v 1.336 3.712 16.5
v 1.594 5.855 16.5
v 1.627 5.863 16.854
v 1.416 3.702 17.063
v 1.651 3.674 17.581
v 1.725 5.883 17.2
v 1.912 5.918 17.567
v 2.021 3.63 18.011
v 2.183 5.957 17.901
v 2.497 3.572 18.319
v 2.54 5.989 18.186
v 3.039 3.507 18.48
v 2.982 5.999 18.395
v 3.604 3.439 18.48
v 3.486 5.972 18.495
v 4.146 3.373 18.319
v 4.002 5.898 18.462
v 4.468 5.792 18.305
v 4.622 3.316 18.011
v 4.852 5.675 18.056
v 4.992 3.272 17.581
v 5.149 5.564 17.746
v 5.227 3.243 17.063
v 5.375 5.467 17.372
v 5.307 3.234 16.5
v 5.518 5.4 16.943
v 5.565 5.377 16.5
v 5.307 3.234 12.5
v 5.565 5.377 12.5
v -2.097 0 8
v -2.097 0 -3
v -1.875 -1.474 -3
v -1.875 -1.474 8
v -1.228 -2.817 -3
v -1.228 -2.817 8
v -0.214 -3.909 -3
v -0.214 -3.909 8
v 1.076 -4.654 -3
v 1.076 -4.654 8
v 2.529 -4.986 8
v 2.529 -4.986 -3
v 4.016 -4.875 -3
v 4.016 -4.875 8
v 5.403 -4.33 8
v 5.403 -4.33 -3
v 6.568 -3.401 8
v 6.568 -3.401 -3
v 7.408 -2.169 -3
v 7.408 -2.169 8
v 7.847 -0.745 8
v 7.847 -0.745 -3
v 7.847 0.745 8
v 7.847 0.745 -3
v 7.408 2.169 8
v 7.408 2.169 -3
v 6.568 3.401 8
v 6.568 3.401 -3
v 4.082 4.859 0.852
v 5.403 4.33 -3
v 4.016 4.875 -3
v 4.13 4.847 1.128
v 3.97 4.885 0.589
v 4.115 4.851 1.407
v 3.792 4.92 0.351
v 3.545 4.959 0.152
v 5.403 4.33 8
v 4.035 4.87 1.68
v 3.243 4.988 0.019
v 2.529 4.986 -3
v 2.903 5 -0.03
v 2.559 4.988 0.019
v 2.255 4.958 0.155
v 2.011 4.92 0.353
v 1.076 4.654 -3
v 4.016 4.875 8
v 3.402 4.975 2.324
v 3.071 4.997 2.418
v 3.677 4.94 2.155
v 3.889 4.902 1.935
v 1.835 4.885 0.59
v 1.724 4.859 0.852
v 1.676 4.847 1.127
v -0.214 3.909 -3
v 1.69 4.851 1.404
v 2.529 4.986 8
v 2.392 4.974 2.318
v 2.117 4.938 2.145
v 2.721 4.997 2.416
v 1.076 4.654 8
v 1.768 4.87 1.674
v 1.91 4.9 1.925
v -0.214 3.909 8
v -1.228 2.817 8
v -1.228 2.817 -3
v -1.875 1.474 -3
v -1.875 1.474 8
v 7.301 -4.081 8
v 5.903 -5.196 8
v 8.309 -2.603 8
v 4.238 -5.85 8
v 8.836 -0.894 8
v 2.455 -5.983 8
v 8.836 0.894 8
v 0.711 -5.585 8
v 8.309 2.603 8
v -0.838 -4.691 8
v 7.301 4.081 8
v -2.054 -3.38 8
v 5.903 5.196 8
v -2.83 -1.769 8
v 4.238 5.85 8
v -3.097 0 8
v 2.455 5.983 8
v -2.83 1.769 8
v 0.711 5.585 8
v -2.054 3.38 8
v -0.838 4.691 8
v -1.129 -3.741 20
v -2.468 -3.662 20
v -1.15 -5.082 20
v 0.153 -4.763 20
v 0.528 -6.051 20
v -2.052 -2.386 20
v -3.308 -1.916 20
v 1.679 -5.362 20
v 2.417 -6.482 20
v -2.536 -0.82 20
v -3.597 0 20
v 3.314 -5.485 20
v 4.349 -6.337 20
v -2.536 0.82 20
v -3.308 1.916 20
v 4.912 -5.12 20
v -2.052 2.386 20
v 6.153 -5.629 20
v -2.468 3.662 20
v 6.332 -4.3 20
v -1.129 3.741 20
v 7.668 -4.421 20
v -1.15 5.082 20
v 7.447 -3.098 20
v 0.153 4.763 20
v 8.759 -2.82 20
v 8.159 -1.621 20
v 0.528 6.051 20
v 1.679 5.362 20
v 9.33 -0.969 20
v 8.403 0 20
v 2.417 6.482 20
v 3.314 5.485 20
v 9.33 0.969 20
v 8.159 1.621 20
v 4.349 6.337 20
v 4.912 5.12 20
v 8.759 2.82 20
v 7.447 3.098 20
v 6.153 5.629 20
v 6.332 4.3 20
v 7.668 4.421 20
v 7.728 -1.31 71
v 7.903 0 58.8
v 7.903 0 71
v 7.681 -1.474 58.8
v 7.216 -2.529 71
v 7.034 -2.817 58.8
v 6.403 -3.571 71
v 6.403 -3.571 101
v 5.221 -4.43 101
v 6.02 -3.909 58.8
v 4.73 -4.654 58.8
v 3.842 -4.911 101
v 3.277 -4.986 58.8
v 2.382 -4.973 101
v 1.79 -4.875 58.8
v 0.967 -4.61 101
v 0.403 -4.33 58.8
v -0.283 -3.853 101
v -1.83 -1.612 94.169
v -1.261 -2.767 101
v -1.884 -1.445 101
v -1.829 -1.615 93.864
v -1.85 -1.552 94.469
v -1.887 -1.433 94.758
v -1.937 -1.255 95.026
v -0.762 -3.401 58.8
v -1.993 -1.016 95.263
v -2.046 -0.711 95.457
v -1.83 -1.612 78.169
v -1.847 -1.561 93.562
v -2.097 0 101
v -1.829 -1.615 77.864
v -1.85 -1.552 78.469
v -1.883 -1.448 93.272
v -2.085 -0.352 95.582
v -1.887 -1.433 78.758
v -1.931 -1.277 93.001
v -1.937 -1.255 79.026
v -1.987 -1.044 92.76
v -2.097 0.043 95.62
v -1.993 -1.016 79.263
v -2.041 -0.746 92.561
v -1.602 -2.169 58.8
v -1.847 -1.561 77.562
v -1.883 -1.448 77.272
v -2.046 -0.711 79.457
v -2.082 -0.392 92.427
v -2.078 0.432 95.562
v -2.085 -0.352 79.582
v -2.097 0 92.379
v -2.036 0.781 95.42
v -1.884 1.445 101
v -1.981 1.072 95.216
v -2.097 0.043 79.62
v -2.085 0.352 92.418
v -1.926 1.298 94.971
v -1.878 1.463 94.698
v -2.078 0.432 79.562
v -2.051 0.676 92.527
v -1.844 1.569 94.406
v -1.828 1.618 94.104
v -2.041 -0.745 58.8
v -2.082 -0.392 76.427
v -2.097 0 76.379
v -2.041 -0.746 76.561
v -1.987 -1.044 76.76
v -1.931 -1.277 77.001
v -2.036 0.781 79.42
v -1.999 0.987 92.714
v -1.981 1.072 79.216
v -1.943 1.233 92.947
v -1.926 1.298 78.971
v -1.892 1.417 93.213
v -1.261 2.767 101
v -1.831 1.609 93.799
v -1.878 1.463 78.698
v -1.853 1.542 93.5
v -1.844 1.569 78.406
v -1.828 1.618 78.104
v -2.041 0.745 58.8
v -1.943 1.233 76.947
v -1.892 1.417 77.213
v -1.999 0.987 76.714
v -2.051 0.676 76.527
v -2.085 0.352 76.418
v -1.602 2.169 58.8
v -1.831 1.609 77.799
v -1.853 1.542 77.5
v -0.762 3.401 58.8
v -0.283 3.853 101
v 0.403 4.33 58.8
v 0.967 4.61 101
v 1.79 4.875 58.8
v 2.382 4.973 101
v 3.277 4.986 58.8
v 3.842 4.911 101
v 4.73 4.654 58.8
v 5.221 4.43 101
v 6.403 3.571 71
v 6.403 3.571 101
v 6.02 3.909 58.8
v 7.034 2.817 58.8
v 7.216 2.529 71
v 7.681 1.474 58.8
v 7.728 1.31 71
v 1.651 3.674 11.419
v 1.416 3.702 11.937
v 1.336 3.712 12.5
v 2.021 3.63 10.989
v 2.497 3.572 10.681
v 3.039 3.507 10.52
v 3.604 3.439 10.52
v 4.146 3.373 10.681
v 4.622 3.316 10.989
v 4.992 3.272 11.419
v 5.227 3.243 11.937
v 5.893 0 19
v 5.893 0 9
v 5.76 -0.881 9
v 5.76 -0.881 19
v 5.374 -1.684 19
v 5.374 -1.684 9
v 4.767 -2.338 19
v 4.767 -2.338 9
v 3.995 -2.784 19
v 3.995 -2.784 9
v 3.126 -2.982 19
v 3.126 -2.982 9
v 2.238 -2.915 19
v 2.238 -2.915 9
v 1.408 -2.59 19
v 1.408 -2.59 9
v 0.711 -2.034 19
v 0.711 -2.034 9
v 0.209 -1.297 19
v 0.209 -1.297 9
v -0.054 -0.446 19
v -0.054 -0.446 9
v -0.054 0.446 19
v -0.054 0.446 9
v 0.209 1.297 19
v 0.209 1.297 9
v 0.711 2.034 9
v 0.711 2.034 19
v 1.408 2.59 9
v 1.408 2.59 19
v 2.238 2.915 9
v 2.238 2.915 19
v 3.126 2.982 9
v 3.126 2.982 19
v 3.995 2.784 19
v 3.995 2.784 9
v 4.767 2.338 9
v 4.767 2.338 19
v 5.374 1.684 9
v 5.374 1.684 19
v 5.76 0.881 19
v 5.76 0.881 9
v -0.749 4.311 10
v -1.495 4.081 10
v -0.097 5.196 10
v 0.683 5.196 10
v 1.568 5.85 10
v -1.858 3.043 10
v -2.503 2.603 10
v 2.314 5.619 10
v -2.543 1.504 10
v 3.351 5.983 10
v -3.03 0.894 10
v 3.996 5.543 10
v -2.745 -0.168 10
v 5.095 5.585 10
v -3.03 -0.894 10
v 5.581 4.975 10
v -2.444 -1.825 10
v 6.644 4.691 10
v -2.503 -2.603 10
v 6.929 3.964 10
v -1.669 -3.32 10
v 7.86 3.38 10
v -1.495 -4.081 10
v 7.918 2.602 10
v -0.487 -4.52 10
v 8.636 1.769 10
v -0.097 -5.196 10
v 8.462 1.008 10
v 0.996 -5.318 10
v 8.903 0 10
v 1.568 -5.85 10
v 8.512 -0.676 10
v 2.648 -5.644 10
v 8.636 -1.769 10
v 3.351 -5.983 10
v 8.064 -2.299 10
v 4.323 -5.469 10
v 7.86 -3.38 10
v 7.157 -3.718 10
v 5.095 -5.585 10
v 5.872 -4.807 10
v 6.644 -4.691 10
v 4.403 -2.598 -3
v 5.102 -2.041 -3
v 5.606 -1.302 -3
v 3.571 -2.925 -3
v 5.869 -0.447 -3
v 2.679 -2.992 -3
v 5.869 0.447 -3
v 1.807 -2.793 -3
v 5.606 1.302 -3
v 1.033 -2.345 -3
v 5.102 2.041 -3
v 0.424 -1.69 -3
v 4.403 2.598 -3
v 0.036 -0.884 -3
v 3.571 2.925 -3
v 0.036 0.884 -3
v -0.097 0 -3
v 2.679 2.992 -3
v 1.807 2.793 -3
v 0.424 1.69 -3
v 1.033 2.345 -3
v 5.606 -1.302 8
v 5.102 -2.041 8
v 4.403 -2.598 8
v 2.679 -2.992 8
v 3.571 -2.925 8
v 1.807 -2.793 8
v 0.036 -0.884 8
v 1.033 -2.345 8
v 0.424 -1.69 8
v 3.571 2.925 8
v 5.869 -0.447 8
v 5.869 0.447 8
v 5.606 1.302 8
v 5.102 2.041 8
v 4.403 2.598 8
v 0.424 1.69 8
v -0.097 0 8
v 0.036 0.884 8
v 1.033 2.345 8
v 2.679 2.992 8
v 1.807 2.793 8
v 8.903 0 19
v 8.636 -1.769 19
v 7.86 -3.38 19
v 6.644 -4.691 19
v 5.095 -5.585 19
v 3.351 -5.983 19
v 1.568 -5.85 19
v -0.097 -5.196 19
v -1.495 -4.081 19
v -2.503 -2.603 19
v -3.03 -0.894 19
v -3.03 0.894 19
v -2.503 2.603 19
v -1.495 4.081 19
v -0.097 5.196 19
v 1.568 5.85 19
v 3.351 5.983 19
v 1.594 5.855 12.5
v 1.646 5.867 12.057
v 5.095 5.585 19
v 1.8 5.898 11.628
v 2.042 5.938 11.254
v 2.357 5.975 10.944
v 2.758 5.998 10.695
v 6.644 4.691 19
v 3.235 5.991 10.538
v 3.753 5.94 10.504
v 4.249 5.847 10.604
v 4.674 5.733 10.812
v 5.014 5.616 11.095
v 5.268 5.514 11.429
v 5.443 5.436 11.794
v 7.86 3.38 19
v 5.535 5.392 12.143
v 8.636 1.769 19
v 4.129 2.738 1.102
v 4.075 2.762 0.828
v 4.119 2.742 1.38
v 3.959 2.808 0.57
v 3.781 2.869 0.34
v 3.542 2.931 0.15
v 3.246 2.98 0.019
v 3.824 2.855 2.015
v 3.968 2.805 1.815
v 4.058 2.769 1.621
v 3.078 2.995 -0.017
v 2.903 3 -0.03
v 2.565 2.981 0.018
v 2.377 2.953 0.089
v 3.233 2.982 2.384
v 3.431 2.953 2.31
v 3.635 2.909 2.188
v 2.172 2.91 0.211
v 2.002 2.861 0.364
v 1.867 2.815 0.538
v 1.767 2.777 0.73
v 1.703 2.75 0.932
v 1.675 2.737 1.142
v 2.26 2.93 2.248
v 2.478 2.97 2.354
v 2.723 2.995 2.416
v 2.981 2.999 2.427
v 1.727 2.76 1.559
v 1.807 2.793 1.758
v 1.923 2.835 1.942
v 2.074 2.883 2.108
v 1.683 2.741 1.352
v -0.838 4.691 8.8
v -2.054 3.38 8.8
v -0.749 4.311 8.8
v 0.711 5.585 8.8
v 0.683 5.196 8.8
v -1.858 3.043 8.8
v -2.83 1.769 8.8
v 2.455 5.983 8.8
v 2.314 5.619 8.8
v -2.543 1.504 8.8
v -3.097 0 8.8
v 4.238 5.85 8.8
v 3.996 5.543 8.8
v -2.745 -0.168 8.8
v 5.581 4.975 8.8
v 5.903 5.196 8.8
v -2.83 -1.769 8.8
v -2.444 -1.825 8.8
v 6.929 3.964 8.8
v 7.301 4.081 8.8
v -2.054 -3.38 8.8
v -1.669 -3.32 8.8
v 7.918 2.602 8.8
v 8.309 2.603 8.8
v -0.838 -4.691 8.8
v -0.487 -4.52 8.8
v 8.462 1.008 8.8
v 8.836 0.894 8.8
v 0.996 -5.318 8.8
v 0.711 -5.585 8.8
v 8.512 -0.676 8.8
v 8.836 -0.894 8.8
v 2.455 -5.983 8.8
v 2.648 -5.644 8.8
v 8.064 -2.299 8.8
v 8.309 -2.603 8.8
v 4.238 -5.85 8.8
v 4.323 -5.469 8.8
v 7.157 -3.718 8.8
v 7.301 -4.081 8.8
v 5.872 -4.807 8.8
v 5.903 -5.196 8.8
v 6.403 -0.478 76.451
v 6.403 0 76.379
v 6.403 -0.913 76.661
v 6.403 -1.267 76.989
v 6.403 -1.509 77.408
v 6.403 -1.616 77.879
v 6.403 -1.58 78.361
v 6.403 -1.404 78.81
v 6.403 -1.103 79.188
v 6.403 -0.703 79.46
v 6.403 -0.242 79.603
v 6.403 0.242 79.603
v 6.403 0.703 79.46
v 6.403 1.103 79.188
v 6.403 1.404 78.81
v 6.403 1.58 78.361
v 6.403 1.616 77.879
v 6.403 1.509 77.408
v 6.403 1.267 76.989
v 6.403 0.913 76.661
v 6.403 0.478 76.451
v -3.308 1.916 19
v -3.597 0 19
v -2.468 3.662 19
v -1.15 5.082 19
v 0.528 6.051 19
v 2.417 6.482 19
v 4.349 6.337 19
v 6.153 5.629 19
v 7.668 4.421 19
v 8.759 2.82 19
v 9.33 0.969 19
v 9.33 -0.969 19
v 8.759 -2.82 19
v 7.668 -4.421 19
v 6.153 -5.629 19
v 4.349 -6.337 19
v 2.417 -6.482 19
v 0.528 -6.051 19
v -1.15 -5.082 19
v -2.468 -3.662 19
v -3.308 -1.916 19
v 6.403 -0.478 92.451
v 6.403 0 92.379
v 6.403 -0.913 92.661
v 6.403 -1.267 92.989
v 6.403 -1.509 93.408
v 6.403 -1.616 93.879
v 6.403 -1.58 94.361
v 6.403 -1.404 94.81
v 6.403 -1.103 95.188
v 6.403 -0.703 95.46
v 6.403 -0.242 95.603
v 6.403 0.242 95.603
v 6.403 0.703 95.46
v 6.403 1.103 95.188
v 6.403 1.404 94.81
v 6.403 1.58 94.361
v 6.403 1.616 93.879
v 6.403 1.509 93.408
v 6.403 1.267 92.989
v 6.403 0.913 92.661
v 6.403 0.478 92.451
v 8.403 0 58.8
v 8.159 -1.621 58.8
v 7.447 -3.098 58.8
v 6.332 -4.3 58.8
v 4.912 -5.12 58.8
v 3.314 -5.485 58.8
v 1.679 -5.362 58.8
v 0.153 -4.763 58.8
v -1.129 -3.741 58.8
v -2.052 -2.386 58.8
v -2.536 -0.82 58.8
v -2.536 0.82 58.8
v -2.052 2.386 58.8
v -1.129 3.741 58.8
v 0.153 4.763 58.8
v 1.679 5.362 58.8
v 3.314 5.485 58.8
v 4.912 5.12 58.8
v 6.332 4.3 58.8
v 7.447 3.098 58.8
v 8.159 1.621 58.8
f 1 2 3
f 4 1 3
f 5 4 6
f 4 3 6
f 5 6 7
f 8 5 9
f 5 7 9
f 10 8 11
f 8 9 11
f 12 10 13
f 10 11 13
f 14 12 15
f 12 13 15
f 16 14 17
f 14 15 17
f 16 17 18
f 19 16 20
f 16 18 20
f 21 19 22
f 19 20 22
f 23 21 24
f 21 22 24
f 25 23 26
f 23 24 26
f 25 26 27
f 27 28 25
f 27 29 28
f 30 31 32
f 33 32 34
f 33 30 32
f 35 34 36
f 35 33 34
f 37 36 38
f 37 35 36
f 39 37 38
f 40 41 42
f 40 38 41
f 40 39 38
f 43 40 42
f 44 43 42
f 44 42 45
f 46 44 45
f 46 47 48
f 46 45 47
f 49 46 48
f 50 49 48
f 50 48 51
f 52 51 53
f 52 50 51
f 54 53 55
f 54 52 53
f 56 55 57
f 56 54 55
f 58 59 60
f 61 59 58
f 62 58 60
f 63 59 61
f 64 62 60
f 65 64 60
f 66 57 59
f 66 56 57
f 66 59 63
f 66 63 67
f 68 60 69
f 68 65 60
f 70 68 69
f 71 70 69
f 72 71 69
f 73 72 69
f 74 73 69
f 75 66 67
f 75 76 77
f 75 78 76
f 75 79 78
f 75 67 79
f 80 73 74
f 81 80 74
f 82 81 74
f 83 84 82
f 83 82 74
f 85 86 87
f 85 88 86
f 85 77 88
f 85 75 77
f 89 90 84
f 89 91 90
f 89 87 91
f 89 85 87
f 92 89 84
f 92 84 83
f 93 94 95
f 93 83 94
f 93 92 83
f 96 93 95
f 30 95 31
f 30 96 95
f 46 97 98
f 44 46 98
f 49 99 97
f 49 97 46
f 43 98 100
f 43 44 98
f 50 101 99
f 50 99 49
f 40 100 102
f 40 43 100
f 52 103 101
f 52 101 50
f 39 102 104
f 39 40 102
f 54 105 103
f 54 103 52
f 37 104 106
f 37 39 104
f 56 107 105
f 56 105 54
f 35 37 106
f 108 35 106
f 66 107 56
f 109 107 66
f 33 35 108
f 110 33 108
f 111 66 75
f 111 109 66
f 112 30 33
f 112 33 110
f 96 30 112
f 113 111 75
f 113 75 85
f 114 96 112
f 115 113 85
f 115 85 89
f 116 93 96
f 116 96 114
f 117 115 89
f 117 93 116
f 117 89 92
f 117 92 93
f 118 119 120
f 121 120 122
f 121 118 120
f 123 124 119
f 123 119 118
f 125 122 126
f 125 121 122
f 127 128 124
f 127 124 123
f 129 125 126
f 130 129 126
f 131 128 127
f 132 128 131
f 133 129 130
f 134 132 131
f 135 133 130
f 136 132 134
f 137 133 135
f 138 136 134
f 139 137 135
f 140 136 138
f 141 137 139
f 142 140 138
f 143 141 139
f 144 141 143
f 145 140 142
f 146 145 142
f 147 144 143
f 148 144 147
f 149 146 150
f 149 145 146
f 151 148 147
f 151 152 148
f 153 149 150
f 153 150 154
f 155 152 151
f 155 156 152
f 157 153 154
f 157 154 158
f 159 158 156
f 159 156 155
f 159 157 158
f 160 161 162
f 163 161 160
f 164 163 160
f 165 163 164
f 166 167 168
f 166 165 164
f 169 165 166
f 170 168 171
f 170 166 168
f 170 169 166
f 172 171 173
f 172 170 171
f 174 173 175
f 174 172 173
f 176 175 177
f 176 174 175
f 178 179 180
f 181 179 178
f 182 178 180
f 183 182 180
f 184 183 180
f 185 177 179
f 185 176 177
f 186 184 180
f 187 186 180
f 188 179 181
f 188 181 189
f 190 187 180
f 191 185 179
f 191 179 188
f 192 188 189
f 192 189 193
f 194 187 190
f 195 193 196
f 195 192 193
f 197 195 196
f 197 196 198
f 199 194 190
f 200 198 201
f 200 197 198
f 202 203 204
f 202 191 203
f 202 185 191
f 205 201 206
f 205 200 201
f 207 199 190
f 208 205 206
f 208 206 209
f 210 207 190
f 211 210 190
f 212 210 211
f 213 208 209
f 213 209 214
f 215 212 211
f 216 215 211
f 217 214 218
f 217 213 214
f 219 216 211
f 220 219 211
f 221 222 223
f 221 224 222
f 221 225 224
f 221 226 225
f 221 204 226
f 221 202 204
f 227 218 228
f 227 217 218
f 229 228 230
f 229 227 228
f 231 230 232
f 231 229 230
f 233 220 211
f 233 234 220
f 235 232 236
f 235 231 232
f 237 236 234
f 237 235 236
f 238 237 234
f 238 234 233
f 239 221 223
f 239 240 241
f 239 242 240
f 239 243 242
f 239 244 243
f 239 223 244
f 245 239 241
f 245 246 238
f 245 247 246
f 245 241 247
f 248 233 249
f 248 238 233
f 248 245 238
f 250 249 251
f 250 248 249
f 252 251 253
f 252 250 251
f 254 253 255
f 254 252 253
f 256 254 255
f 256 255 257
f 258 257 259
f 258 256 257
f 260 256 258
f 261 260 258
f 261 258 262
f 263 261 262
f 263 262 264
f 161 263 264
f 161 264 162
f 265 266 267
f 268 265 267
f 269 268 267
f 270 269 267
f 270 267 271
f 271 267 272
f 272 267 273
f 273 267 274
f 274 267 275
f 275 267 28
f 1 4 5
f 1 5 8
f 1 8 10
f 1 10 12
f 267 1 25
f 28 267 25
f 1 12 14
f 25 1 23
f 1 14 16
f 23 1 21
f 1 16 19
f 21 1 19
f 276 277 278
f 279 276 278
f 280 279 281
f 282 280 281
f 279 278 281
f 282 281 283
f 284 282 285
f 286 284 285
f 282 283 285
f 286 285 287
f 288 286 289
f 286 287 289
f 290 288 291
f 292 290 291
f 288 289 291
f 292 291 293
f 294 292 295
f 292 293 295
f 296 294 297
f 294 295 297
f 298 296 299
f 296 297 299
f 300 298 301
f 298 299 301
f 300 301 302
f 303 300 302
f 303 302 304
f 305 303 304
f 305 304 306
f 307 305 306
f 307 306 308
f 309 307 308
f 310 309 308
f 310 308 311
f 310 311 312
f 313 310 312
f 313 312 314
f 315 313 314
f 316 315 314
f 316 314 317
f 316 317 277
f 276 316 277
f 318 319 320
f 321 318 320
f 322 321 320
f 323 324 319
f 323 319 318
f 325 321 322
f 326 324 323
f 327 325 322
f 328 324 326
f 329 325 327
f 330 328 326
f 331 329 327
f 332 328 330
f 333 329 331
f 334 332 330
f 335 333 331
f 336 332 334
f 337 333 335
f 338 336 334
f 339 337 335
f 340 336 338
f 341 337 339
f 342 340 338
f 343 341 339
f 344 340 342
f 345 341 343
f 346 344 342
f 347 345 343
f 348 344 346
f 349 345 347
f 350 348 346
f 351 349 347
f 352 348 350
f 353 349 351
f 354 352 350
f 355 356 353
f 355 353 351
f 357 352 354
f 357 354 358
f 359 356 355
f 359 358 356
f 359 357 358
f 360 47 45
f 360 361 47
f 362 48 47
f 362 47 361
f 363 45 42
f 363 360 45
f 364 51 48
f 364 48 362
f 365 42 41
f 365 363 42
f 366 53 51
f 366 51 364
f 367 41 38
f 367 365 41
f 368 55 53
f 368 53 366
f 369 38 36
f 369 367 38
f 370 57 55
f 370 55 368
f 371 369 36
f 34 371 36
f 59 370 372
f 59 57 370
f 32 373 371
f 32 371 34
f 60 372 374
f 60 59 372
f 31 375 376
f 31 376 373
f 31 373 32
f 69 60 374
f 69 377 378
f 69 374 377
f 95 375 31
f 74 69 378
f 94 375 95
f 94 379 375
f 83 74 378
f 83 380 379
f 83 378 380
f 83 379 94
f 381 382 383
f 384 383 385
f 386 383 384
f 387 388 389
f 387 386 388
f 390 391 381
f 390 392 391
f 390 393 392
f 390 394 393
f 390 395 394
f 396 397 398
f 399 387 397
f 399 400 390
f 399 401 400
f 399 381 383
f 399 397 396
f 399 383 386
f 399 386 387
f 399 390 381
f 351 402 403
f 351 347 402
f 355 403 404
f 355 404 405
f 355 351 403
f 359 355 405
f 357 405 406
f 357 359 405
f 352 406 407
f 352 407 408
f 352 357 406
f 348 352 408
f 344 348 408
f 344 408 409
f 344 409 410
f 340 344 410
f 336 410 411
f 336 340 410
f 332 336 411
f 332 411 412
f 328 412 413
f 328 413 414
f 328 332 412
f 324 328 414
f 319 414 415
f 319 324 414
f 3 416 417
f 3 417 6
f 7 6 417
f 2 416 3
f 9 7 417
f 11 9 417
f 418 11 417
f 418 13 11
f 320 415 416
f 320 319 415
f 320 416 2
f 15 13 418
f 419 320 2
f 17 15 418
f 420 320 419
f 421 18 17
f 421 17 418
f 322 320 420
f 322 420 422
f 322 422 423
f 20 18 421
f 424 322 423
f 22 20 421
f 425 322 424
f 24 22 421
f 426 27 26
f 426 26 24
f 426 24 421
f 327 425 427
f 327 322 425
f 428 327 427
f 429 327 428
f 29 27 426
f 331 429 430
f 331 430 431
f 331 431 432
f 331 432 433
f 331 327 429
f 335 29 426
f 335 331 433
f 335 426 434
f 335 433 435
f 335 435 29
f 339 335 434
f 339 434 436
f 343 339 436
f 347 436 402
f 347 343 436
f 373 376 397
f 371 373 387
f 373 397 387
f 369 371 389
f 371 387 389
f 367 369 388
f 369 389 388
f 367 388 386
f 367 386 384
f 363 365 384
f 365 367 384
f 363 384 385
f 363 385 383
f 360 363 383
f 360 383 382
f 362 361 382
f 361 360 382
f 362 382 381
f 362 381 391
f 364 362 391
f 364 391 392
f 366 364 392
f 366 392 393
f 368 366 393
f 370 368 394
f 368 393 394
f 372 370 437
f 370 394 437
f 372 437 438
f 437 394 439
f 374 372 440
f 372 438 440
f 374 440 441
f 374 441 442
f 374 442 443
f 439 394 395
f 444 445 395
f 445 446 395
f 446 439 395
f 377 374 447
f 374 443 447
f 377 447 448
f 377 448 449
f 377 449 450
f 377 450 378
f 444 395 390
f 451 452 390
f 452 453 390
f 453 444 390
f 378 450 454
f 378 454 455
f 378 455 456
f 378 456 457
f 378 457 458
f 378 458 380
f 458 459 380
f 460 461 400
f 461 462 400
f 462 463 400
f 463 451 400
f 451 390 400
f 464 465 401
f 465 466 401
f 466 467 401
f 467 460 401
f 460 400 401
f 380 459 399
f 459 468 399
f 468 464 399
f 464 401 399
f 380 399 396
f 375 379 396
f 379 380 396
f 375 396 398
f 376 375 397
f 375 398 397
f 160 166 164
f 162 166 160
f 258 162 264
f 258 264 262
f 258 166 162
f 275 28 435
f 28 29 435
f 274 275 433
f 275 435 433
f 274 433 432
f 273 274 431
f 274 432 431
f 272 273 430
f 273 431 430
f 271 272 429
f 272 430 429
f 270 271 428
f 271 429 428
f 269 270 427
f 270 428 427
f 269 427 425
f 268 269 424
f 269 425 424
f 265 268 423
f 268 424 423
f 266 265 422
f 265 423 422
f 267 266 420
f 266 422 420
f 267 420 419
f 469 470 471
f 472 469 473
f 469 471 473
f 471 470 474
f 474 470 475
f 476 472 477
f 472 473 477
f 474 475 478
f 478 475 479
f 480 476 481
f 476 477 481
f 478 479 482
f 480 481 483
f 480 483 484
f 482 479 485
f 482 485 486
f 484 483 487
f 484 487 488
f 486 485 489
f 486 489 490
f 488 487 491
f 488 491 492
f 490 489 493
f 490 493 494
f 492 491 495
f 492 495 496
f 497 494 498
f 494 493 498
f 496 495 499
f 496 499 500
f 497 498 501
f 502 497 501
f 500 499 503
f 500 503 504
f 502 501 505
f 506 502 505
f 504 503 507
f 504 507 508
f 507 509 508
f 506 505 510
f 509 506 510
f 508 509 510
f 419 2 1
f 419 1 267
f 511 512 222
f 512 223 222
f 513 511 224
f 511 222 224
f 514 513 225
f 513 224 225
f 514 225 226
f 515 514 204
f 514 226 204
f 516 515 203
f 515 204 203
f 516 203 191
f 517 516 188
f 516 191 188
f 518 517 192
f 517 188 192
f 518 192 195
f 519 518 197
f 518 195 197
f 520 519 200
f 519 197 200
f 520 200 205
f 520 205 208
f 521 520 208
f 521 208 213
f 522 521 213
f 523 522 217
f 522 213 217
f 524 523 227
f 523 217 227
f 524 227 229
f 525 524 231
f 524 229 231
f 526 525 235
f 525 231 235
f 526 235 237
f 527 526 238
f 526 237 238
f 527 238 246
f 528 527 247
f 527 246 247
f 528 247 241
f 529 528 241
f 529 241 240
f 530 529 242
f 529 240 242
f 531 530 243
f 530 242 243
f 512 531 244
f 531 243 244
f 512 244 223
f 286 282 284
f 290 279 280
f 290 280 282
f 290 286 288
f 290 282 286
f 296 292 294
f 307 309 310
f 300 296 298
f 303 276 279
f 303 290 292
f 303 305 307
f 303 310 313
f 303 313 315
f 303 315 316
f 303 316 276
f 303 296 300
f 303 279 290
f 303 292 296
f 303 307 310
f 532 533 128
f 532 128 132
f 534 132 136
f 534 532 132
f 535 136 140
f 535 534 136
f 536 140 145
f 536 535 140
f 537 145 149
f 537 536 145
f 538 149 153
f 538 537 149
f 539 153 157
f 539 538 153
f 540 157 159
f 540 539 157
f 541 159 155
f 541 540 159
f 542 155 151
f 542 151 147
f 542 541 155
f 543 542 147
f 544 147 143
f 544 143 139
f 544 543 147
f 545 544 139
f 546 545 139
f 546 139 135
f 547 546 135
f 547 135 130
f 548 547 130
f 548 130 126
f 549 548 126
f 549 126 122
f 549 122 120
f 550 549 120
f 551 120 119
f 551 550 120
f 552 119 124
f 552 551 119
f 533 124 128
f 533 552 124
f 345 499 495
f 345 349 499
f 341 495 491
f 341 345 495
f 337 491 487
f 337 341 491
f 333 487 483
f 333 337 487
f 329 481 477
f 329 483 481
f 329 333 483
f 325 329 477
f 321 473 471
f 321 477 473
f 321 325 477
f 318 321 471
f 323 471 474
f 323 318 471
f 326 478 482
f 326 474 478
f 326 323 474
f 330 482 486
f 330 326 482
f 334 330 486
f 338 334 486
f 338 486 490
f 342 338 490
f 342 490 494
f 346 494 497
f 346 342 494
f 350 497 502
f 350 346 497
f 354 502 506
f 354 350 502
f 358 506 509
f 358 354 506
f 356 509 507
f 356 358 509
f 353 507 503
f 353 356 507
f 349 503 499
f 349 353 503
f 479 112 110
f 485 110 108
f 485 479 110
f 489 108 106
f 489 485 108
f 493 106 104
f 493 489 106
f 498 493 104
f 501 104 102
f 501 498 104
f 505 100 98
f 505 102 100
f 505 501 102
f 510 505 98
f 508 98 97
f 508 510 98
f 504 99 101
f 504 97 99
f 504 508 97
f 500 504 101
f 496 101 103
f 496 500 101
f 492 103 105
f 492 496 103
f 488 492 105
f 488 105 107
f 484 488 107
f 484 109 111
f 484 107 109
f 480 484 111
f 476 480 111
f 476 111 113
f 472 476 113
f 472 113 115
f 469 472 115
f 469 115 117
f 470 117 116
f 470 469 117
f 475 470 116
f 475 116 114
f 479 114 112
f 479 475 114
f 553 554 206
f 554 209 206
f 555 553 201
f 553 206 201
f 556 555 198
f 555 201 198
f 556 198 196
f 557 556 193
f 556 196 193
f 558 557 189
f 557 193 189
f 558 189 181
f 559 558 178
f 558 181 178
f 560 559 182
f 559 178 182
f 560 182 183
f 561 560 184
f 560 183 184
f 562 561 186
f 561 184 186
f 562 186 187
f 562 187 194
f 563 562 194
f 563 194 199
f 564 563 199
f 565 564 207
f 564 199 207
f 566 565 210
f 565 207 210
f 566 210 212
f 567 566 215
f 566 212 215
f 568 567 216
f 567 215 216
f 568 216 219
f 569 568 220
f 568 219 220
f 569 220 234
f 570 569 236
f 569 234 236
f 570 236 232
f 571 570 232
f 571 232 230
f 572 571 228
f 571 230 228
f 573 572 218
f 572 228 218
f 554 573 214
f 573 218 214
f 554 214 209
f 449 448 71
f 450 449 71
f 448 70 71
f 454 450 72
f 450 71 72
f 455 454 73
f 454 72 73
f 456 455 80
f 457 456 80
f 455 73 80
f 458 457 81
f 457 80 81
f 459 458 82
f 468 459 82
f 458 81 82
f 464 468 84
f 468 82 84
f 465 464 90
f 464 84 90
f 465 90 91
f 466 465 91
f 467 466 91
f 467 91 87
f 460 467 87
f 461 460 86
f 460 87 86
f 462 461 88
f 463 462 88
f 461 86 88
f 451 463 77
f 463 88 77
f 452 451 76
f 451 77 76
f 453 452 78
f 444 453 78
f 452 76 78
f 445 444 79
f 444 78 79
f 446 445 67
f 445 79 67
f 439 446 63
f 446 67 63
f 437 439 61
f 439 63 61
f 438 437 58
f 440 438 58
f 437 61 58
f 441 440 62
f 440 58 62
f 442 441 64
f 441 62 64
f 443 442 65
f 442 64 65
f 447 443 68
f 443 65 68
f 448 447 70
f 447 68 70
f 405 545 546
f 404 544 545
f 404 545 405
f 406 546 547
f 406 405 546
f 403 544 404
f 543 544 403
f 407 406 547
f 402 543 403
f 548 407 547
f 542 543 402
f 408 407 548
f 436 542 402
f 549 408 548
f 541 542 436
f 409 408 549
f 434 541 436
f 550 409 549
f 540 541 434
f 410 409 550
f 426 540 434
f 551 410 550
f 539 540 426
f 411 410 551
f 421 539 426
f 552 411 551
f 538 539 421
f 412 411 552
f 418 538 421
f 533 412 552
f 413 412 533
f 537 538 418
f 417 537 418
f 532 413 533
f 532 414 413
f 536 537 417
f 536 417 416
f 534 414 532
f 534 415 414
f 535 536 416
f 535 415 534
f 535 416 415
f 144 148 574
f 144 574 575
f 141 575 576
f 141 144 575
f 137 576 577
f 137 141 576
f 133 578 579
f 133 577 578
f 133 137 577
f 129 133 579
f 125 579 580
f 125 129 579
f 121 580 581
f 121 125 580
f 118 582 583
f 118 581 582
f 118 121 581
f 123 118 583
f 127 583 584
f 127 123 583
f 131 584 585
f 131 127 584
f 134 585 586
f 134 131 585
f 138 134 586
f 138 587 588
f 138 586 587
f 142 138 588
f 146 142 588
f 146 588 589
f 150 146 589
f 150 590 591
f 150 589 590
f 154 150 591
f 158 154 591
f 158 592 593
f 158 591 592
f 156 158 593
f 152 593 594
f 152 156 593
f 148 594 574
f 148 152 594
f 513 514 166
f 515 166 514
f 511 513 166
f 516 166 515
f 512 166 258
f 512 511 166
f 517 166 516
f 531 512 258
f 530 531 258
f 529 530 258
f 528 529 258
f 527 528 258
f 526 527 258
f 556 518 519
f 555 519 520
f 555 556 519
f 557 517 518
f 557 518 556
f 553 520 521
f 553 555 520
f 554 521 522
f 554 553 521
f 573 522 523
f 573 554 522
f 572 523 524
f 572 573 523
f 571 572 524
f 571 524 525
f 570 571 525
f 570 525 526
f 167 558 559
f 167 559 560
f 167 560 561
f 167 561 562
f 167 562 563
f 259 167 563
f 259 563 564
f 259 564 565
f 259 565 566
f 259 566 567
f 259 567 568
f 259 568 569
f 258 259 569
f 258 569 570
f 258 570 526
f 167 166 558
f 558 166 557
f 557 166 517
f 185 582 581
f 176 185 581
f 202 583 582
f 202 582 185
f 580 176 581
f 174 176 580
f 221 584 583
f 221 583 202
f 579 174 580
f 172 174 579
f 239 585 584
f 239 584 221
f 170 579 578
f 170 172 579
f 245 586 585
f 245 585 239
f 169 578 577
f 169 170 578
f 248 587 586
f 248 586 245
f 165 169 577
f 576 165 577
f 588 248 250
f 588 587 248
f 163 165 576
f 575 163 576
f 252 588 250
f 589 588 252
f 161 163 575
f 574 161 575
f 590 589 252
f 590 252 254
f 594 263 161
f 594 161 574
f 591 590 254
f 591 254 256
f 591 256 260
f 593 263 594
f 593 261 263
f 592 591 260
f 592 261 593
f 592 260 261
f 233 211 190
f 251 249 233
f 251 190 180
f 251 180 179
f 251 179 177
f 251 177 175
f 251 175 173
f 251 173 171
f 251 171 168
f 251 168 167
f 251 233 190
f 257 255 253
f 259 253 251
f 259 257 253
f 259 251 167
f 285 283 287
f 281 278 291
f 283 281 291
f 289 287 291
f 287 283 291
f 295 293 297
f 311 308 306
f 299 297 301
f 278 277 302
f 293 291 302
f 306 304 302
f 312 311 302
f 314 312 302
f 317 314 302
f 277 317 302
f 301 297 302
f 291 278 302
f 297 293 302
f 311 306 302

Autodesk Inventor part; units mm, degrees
ref_plane "YZ Plane" through (0, 0, 0) normal (1, 0, 0) x (0, 1, 0)
sketch "Эскиз1" plane through (0, 0, 0) normal (0, 0, 1) x (1, 0, 0)
  arc A0 (0.3914, -1.6228) -> (0.394, 1.6268) centre (2.903, 0) ccw construction
  circle A1 centre (2.903, 0) radius 2.9903
  circle A2 centre (2.903, 0) radius 6
  point P0 (0, 0)
  dimension "d0" = 12
extrude "Выдавливание1" add sketch "Эскиз1" along normal blind 24
ref_plane "РабПлоскость2" through (3.6207, 5.9569, 0) normal (-0.1196, -0.9928, 0) x (0.9928, -0.1196, 0)
ref_plane "РабПлоскость1" through (5.8216, 7.5048, 10) normal (-0.1196, -0.9928, 0) x (0.9928, -0.1196, 0)
sketch "Эскиз2" plane through (3.6207, 5.9569, 0) normal (-0.1196, -0.9928, 0) x (0.9928, -0.1196, 0)
  line L0 (6, 0) -> (-6, 0) projected
  line L1 (0, 0) -> (0, 19.3984) construction
  line L2 (0, 12.5) -> (0, 16.5) construction
  line L3 (2, 12.5) -> (2, 16.5)
  line L4 (-2, 16.5) -> (-2, 12.5)
  arc A0 (-2, 12.5) -> (2, 12.5) centre (0, 12.5) ccw
  arc A1 (2, 16.5) -> (-2, 16.5) centre (0, 16.5) ccw
  point P0 (-2.8822, 0)
  point P1 (0, 14.5)
  dimension "d0" = 12
  dimension "d3" = 4
  dimension "d4" = 4
  dimension "d5" = 14.5
extrude "Выдавливание2" cut sketch "Эскиз2" along normal blind 2.5
ref_plane "РабПлоскость3" through (2.903, 0, 19) normal (0, 0, -1) x (-1, 0, 0)
sketch "Эскиз3" plane through (2.903, 0, 19) normal (0, 0, -1) x (-1, 0, 0)
  point P0 (2.903, 0)
sketch "Эскиз4" plane through (2.903, 0, 19) normal (0, 0, -1) x (-1, 0, 0)
  circle A0 centre (0, 0) radius 6.5
  point P0 (2.903, 0)
  dimension "d12" = 13
extrude "Выдавливание3" add sketch "Эскиз4" against normal blind 20
sketch "Эскиз5" plane through (2.903, 0, 39) normal (0, 0, 1) x (1, 0, 0)
  circle A0 centre (0, 0) radius 5
  circle A1 centre (0, 0) radius 7.2744
  point P0 (-2.903, 0)
  dimension "d15" = 10
extrude "Выдавливание4" cut sketch "Эскиз5" against normal blind 19
sketch "Эскиз6" plane through (2.903, 0, 0) normal (0, 0, -1) x (-1, 0, 0)
  circle A0 centre (0, 0) radius 3
  circle A1 centre (0, 0) radius 5
  point P0 (2.903, 0)
  dimension "d18" = 6
  dimension "d19" = 10
ref_plane "РабПлоскость4" through (-4.5219, -7.4249, -3) normal (0, 0, 1) x (1, 0, 0)
sketch "Эскиз8" plane through (2.903, 0, 0) normal (0, 0, -1) x (-1, 0, 0)
  circle A0 centre (0, 0) radius 6 projected
  point P0 (2.903, 0)
extrude "Выдавливание6" cut sketch "Эскиз8" against normal blind 9
sketch "Эскиз9" plane through (2.903, 0, 9) normal (0, 0, -1) x (-1, 0, 0)
  circle A0 centre (0, 0) radius 3
  circle A1 centre (0, 0) radius 5
  point P0 (2.903, 0)
  dimension "d24" = 6
  dimension "d25" = 10
ref_plane "РабПлоскость5" through (-4.5219, -7.4249, -3) normal (0, 0, 1) x (1, 0, 0)
extrude "Выдавливание7" add sketch "Эскиз9" along normal up to surface (12 mm away)
sketch "Эскиз10" plane through (2.903, 0, 39) normal (0, 0, 1) x (1, 0, 0)
  circle A0 centre (0, 0) radius 5
  point P0 (-2.903, 0)
extrude "Выдавливание8" add sketch "Эскиз10" along normal blind 62
sketch "Эскиз11" plane through (2.903, 0, 101) normal (0, 0, 1) x (1, 0, 0)
  line L0 (3.5, 4.5942) -> (9.6944, 4.5942)
  line L1 (9.6944, 4.5942) -> (9.6944, -5.4033)
  line L2 (9.6944, -5.4033) -> (3.5, -5.4033)
  line L3 (3.5, -5.4033) -> (3.5, 4.5942)
  circle A0 centre (0, 0) radius 5 projected
  point P0 (-2.903, 0)
  point P1 (3.5, 3.5707)
  point P2 (3.5, -3.5707)
  dimension "d30" = 3.5
extrude "Выдавливание9" cut sketch "Эскиз11" against normal blind 30 contours A0 L3 picked at (3.7121, 0.9363)
sketch "Эскиз12" plane through (2.903, 0, 20) normal (0, 0, 1) x (1, 0, 0)
  circle A0 centre (0, 0) radius 5.5
  point P0 (-2.903, 0)
  dimension "d33" = 11
extrude "Выдавливание10" add sketch "Эскиз12" along normal blind 38.8
sketch "Эскиз13" plane through (6.403, -3.5707, 101) normal (1, 0, 0) x (0, 0, -1)
  point P0 (101, 3.5707)
sketch "Эскиз14" plane through (6.403, -3.5707, 101) normal (1, 0, 0) x (0, 0, -1)
  point P0 (101, 3.5707)
sketch "Эскиз15" plane through (6.403, -3.5707, 101) normal (1, 0, 0) x (0, 0, -1)
  line L0 (30, 0) -> (30, 7.1414) projected
  line L1 (30, 3.5707) -> (0, 3.5707) construction
  line L2 (0, 8.5707) -> (0, -1.4293) projected
  point P0 (101, 3.5707)
  point P1 (0, 7.1414)
  point P2 (0, 0)
  point P3 (7, 3.5707)
  point P4 (23, 3.5707)
  dimension "d36" = 7
  dimension "d37" = 7
hole "Отверстие1" at (6.403, 0, 94) at (6.403, 0, 78) direction (-1, 0, 0) diameter 3.242 depth 11.8 tip angle 118 thread size "M4x0.7" class "6H" standard "ISO Metric profile"
sketch "Эскиз16" plane through (2.903, 0, 9) normal (0, 0, -1) x (-1, 0, 0)
  circle A0 centre (0, 0) radius 6 projected
  point P0 (2.903, 0)
extrude "Выдавливание11" add sketch "Эскиз16" along normal blind 1
ref_plane "РабПлоскость6" through (2.903, 0, 10) normal (0, 0, -1) x (0.9928, -0.1196, 0)
sketch "Эскиз17" plane through (2.903, 0, 10) normal (0, 0, -1) x (0.9928, -0.1196, 0)
  circle A0 centre (0, 0) radius 5.65
  circle A1 centre (0, 0) radius 7.5447
  point P0 (-2.8822, 0.3472)
  dimension "d47" = 11.3
extrude "Выдавливание12" cut sketch "Эскиз17" along normal blind 1.2
sketch "Эскиз18" plane through (0, 0, 0) normal (0, 1, 0) x (-1, 0, 0)
  line L0 (-7.903, -3) -> (2.097, -3) construction
  line L1 (2.097, -3) -> (-7.903, -3)
  line L2 (-2.903, -3) -> (-2.903, 1.2) construction
  point P0 (0, 0)
  dimension "d50" = 4.2
hole "Отверстие2" at (2.903, 0, 1.2) direction (0, 1, 0) diameter 2.459 depth 8.8 tip angle 118 thread size "M3x0.5" class "6H" standard "ISO Metric profile"
properties part number "Вал вертикальной оси"
